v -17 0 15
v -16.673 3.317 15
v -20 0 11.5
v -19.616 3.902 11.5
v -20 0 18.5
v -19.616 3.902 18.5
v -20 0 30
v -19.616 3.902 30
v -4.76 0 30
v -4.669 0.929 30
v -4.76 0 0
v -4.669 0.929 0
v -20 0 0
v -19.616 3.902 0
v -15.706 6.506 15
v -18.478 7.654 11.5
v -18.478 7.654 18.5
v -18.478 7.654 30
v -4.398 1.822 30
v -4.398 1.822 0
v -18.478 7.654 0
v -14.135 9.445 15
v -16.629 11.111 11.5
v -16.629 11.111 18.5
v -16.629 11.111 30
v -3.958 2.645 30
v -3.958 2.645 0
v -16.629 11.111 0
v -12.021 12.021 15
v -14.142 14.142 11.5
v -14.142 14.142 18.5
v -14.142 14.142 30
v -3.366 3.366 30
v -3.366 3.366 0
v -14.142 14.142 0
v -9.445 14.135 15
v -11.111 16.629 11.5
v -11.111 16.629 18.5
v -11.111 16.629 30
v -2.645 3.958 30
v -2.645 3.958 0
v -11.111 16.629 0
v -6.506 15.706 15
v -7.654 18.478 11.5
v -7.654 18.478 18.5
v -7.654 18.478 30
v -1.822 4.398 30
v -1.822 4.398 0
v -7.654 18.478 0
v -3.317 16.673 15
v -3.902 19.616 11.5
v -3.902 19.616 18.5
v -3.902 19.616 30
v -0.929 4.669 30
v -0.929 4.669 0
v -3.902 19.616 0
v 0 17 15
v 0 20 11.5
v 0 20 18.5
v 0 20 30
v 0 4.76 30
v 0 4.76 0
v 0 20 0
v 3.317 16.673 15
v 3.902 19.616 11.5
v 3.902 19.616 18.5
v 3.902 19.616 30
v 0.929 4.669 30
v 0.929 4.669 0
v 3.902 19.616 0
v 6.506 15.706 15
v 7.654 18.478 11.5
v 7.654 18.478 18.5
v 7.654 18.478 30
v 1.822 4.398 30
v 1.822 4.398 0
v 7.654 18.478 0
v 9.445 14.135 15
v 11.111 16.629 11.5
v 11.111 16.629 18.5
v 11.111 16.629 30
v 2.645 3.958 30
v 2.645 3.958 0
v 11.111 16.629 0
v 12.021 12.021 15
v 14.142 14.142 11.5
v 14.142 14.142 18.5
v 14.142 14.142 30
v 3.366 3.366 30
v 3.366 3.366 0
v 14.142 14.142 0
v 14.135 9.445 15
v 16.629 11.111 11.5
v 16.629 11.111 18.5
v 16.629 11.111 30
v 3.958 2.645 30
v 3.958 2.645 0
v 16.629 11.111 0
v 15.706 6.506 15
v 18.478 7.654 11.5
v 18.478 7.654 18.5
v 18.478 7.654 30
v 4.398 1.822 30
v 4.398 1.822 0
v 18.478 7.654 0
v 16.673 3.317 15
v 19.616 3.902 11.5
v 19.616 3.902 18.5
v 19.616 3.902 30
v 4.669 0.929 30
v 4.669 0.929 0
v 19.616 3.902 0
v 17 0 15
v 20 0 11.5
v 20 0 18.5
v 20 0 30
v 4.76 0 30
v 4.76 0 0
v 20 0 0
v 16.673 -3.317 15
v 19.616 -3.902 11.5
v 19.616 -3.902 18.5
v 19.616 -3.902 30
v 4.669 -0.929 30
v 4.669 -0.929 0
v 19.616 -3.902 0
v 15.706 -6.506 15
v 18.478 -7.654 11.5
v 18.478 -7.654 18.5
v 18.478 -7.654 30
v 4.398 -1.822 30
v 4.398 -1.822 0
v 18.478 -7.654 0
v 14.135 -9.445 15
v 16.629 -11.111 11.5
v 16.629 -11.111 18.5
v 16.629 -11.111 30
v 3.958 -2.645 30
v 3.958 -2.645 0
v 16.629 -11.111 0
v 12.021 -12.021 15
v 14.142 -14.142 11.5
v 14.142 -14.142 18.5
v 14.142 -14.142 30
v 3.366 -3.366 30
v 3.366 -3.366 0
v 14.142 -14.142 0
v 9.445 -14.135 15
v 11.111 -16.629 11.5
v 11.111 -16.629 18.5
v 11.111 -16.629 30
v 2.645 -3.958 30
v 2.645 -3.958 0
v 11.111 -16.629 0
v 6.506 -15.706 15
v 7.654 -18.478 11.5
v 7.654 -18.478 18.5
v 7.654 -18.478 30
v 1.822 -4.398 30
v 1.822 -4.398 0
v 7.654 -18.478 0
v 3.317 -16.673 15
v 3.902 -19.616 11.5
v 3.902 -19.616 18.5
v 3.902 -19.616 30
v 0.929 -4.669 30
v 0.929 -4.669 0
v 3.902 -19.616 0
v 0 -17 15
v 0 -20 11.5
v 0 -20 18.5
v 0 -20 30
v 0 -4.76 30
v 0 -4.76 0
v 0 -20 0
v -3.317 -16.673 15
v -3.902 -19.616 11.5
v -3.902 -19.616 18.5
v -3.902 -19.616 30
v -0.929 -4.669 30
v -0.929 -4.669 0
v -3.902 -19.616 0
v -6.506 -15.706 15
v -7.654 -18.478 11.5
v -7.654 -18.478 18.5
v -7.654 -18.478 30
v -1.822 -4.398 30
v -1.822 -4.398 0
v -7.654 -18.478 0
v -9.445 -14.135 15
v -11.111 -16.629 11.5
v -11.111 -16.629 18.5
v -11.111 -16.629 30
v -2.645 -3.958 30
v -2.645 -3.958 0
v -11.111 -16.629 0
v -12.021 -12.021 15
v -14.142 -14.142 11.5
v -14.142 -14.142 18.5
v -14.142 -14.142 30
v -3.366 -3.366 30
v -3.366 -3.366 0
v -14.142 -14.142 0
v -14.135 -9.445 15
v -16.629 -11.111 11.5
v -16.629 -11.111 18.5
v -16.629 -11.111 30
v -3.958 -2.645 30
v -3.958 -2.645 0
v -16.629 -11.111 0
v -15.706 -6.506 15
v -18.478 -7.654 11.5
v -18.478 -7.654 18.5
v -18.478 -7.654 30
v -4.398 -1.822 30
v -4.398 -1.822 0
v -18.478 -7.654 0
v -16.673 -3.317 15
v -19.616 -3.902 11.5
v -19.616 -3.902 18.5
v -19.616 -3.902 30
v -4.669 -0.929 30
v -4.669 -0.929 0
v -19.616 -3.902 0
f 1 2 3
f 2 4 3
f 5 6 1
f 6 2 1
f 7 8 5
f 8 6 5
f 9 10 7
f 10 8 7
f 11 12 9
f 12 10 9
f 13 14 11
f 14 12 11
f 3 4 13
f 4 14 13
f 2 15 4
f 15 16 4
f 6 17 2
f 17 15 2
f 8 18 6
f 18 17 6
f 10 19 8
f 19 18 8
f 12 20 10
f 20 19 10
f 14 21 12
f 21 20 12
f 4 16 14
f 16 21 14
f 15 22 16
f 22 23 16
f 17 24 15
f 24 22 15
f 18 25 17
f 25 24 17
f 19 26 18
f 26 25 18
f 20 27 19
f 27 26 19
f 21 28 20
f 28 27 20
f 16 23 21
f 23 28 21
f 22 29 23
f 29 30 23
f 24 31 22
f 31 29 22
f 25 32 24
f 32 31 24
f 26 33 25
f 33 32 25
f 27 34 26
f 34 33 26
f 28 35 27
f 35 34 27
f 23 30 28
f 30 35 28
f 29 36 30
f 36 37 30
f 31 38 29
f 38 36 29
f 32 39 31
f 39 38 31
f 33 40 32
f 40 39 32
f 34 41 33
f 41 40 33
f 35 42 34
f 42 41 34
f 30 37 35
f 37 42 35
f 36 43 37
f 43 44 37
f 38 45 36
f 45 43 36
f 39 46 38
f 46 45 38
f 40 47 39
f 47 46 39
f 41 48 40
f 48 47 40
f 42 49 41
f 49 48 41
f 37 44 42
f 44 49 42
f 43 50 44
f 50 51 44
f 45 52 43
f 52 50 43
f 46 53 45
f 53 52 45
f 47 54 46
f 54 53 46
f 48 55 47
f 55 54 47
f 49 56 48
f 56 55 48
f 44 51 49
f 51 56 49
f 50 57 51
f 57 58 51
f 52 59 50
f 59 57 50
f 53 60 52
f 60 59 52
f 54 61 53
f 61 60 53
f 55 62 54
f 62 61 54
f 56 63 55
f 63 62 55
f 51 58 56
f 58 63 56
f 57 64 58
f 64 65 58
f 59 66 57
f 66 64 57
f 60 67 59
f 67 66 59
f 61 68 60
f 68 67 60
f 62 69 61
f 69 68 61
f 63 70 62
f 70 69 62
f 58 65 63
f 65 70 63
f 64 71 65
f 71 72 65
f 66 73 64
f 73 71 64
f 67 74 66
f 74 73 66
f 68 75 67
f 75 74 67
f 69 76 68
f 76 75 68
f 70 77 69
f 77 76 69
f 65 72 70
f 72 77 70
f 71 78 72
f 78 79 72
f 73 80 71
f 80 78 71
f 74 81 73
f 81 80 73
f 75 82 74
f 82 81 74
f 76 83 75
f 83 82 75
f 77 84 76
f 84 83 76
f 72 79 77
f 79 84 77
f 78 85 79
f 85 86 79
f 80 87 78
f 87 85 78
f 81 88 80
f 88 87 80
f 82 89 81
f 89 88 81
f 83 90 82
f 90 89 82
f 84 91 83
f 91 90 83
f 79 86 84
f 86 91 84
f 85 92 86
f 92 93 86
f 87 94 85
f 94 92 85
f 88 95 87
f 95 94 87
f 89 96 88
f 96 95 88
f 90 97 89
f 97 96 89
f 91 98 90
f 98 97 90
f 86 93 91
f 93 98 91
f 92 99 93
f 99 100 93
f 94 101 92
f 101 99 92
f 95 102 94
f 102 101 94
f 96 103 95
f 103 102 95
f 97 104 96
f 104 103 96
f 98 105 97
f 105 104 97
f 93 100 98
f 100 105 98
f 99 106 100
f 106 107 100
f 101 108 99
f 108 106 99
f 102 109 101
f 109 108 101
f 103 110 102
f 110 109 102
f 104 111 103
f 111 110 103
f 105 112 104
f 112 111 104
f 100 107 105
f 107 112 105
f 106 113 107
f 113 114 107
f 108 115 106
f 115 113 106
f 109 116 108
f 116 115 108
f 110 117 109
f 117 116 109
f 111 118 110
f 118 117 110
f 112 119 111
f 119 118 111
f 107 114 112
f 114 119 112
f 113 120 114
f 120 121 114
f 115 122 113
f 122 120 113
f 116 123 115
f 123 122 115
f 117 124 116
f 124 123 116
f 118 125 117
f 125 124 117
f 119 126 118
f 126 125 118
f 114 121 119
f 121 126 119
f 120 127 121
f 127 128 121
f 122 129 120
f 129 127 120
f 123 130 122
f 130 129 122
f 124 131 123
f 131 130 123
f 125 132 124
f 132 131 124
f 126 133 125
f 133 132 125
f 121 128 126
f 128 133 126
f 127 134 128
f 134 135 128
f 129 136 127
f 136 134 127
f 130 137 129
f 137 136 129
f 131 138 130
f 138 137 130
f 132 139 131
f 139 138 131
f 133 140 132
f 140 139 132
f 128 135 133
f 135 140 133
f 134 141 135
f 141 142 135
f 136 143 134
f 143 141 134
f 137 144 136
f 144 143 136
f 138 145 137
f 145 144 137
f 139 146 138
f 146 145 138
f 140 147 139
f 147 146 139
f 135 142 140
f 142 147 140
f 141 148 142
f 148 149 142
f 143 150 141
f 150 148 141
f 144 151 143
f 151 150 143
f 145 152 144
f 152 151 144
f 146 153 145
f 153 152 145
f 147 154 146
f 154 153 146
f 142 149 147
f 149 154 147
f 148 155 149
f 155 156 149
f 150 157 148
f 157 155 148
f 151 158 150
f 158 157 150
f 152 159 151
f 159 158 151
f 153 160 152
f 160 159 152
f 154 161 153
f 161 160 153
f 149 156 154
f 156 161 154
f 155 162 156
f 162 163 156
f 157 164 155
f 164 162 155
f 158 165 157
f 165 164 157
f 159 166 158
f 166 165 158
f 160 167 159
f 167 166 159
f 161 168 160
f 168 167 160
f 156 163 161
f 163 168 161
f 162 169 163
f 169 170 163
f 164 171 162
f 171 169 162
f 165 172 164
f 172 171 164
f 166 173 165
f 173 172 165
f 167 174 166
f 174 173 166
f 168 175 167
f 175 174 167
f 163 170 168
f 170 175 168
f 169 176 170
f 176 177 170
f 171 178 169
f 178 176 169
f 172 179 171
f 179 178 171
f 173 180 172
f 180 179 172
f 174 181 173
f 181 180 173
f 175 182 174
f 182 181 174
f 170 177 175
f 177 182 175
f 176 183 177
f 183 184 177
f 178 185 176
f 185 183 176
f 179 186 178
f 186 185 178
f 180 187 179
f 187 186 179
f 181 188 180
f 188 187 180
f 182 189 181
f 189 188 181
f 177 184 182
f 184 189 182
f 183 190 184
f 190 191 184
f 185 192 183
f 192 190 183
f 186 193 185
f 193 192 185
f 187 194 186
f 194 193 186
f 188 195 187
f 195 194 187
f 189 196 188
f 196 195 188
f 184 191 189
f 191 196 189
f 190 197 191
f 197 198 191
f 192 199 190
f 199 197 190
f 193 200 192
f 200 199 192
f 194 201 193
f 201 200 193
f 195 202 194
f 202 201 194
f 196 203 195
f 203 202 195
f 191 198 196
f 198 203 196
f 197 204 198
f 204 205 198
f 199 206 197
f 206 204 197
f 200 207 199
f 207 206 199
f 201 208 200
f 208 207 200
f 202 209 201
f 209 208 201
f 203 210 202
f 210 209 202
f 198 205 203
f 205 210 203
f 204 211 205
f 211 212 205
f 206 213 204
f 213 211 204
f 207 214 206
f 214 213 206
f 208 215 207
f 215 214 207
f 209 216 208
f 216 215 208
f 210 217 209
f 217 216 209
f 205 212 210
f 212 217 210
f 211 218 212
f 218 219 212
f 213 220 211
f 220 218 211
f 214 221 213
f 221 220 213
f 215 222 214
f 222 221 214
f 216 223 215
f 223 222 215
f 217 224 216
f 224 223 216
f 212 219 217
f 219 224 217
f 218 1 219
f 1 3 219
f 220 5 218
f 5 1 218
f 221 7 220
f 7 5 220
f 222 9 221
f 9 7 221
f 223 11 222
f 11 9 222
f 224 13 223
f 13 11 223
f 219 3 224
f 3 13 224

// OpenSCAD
$fn = 32;

// ----------------------------------------------------------------------
// Belt roller: 40 mm barrel, 30 mm wide, bore 9.52 mm
// ----------------------------------------------------------------------

// --- parameters (mm) ---
bore_d = 9.52;            // bore
barrel_d = 40;            // barrel diameter
roller_w = 30;            // roller width
groove_w = 7;             // guide groove width
groove_d = 3;             // guide groove depth

roller_profile = [[4.76, 0], [20, 0], [20, 11.5], [17, 15], [20, 18.5], [20, 30], [4.76, 30]];

/* the profile stays clear of the axis, so the bore comes out of the revolve */
rotate_extrude() polygon(roller_profile);
